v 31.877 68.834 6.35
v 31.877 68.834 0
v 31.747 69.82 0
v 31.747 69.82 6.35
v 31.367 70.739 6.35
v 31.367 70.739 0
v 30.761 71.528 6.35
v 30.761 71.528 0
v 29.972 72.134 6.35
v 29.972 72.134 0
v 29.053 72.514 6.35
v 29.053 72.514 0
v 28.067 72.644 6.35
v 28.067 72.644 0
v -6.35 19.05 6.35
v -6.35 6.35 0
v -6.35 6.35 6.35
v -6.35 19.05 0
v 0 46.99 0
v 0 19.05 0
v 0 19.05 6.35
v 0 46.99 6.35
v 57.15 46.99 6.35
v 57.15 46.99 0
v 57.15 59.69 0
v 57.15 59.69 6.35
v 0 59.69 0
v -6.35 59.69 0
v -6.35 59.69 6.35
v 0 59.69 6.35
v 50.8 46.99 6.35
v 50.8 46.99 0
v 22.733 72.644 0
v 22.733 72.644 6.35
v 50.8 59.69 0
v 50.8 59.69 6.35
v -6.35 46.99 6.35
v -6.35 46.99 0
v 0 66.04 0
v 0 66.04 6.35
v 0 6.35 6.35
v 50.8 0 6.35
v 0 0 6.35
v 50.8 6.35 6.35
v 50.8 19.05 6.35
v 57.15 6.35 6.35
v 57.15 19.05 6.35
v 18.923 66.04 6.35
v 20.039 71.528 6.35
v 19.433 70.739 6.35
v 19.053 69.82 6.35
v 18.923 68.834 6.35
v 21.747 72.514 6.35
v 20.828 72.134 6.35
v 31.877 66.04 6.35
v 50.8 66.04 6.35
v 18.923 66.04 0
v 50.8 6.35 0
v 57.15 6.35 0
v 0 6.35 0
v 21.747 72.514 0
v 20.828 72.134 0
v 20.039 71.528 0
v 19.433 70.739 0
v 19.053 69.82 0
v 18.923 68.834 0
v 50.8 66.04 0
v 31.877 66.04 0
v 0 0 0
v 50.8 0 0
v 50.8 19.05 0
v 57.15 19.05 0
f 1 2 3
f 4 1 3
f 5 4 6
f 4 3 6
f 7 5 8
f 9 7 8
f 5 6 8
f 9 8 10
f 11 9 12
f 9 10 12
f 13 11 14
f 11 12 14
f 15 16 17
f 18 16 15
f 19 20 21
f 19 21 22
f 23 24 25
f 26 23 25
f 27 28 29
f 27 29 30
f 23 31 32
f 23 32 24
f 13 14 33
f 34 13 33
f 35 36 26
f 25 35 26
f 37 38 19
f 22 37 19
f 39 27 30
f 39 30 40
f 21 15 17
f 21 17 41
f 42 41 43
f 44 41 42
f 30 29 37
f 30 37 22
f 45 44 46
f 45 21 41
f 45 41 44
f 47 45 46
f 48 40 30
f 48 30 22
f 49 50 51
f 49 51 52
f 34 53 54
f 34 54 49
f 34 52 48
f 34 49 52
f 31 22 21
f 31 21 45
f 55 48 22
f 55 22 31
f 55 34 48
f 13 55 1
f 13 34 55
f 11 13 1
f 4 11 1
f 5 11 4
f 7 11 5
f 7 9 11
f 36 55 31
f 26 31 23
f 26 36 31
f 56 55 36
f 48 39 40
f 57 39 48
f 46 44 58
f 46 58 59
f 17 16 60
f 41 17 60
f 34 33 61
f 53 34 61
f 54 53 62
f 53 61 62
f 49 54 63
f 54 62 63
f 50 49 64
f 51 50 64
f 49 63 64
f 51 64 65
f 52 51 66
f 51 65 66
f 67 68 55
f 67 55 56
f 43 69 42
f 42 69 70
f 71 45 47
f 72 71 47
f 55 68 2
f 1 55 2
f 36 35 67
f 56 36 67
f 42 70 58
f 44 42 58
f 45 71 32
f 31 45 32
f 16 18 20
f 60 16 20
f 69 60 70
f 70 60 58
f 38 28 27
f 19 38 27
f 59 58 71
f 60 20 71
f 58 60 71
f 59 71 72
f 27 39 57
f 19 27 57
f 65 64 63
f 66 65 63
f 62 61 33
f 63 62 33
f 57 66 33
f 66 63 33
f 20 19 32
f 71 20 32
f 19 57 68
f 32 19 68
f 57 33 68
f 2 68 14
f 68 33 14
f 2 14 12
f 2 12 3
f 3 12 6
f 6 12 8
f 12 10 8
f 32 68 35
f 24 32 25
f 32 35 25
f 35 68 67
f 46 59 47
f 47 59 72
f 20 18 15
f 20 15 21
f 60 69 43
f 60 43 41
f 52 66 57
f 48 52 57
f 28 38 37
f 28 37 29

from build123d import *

# Parameters (mm, degrees)
SKETCH1_W           = 50.8
SKETCH1_H           = 66.04
BOSS_EXTRUDE1_DEPTH = 6.35
SKETCH2_W           = 6.35
SKETCH2_H           = 12.7
BOSS_EXTRUDE2_DEPTH = 6.35


with BuildPart() as part:
    # Sketch1 → Boss-Extrude1 (new body)
    with BuildSketch(Plane.XY):
        with Locations((25.4, 33.02)):
            Rectangle(SKETCH1_W, SKETCH1_H)
    extrude(amount=BOSS_EXTRUDE1_DEPTH)

    # Sketch2 → Boss-Extrude2 (add)
    with BuildSketch(Plane.XY):
        with Locations((-3.175, 53.34)):
            Rectangle(SKETCH2_W, SKETCH2_H)
        with Locations((-3.175, 12.7)):
            Rectangle(SKETCH2_W, SKETCH2_H)
        with Locations((53.975, 12.7)):
            Rectangle(SKETCH2_W, SKETCH2_H)
        with Locations((53.975, 53.34)):
            Rectangle(SKETCH2_W, SKETCH2_H)
        with BuildLine():
            Line((18.923, 66.04), (31.877, 66.04))
            Line((31.877, 66.04), (31.877, 68.834))
            ThreePointArc((31.877, 68.834), (30.761076836, 71.528076836), (28.067, 72.644))
            Line((28.067, 72.644), (22.733, 72.644))
            ThreePointArc((22.733, 72.644), (20.038923164, 71.528076836), (18.923, 68.834))
            Line((18.923, 68.834), (18.923, 66.04))
        make_face()
    extrude(amount=BOSS_EXTRUDE2_DEPTH)


solid = part.part
